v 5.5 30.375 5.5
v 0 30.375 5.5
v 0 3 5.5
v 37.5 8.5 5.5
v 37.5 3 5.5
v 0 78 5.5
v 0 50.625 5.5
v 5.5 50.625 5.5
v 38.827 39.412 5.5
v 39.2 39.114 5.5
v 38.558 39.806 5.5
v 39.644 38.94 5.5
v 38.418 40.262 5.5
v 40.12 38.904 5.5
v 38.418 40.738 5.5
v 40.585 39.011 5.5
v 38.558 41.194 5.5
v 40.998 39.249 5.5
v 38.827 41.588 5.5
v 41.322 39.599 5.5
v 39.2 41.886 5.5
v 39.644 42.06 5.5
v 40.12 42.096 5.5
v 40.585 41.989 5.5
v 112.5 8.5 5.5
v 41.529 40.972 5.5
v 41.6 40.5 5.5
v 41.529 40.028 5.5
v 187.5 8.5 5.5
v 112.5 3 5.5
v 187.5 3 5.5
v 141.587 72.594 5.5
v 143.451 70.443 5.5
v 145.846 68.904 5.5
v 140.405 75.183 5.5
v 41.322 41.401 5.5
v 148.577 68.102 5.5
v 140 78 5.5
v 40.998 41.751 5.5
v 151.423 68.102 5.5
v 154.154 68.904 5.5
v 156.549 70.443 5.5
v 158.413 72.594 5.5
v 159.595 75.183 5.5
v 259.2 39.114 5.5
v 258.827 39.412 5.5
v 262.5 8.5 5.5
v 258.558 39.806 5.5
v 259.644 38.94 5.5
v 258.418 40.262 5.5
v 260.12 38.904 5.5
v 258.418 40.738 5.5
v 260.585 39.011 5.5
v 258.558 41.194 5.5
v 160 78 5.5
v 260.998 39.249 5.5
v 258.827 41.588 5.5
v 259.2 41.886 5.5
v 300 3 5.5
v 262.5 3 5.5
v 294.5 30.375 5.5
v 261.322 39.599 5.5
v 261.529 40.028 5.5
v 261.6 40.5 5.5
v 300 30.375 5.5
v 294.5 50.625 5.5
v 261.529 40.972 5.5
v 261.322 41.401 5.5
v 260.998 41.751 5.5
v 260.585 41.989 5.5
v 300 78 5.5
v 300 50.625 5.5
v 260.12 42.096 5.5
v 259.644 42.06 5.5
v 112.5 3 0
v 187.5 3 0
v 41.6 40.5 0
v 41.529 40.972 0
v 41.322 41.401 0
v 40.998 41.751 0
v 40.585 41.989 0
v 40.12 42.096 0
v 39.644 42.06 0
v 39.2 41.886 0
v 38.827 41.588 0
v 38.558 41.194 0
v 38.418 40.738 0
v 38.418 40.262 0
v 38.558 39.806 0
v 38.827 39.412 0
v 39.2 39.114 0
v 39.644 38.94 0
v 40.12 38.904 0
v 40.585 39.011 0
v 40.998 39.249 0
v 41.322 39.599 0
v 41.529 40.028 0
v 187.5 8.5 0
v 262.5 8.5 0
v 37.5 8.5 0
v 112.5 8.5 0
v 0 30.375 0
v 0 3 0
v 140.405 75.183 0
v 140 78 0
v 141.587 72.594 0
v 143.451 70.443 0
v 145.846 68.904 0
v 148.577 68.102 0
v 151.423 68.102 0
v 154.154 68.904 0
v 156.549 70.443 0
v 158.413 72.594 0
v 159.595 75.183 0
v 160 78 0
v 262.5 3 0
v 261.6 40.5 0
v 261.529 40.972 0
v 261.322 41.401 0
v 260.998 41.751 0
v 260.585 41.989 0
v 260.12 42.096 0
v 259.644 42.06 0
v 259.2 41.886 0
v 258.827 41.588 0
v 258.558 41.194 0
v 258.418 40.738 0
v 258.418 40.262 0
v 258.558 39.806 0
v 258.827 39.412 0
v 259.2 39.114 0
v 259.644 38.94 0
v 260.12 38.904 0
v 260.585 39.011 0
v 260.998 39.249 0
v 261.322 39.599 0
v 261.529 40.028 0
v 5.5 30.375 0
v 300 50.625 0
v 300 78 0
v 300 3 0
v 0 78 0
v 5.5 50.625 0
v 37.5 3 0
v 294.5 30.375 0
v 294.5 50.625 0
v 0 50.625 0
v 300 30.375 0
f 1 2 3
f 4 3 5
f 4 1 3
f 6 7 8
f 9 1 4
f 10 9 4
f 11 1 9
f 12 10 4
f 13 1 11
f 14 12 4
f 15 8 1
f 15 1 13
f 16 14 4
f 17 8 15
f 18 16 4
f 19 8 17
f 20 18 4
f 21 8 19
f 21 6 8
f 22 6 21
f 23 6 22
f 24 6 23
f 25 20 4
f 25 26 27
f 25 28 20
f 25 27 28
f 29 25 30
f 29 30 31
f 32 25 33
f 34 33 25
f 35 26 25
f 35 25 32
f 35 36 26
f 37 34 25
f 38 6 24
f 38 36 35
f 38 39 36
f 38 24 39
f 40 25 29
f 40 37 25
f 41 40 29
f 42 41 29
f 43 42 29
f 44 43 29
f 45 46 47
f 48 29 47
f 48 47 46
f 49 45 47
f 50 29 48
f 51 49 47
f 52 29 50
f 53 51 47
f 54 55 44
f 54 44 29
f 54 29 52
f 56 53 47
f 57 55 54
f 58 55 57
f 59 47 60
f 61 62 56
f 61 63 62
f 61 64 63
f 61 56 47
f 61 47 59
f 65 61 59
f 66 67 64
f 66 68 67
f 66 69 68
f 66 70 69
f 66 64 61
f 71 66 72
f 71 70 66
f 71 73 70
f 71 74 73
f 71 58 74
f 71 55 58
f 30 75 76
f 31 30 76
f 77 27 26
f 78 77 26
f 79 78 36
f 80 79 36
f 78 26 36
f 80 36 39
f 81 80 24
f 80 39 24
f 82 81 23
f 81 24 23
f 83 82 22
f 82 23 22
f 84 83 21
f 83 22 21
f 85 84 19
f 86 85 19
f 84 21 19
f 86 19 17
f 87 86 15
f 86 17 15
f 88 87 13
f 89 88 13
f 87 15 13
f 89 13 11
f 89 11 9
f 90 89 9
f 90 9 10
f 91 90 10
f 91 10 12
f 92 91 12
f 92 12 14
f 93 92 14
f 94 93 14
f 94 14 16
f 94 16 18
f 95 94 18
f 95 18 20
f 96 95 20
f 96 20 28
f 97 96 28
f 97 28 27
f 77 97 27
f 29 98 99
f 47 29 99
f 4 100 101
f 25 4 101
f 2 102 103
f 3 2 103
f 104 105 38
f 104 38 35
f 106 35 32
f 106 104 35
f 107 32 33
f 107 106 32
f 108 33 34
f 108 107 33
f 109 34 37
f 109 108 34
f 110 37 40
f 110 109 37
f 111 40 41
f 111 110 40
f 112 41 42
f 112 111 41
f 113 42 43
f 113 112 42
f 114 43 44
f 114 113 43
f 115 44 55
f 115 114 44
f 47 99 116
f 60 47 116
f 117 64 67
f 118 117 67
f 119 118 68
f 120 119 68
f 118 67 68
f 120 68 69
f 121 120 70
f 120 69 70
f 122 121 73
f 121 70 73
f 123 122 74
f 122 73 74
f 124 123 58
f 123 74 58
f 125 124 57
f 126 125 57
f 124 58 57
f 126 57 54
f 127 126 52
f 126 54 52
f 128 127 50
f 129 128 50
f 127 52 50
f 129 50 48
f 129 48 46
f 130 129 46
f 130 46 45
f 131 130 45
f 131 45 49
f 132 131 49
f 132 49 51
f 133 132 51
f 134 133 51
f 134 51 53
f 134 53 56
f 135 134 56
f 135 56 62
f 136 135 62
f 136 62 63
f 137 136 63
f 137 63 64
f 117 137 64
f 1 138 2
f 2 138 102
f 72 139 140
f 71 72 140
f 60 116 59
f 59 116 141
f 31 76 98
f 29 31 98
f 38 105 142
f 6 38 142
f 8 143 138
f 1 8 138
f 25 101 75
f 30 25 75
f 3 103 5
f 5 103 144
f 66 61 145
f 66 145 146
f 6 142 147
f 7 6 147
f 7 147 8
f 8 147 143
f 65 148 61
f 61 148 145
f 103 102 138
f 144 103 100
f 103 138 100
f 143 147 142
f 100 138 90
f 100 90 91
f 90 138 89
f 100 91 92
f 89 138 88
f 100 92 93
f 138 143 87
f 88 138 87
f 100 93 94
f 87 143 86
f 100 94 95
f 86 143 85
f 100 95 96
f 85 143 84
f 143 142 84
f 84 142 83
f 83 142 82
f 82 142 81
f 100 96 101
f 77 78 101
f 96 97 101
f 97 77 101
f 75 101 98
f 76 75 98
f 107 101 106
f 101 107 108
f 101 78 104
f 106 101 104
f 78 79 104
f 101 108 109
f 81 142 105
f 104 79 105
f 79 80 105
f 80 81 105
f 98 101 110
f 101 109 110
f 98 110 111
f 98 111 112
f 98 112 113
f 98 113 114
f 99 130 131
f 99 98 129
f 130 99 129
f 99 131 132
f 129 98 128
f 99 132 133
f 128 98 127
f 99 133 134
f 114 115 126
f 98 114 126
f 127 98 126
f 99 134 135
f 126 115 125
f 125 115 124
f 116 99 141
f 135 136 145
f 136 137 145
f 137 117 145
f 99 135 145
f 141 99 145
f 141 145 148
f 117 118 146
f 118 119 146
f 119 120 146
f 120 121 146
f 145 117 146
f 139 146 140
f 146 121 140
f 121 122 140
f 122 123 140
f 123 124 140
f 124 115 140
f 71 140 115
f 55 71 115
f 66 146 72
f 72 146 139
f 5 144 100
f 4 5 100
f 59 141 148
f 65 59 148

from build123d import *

# Parameters (mm, degrees)
BOSS_EXTRUDE1_DEPTH = 5.5
SKETCH2_R           = 10
CUT_EXTRUDE2_DEPTH  = 311.022983019
SKETCH3_R           = 1.6
CUT_EXTRUDE3_DEPTH  = 311.022983019
SKETCH4_W           = 9.45
SKETCH4_H           = 3.25
SKETCH4_W_2         = 2.65
SKETCH4_H_2         = 1.25
SKETCH4_W_3         = 3.25
SKETCH4_H_3         = 9.45
SKETCH4_H_4         = 2.65
SKETCH4_W_4         = 1.25
BOSS_EXTRUDE2_DEPTH = 5.5


with BuildPart() as part:
    # Sketch1 → Boss-Extrude1 (new body)
    with BuildSketch(Plane.XY):
        Polygon((0, 78), (0, 50.625), (5.5, 50.625), (5.5, 42.125), (14.95, 42.125), (14.95, 43.375), (17.6, 43.375), (17.6, 42.125), (20.25, 42.125), (20.25, 38.875), (17.6, 38.875), (17.6, 37.625), (14.95, 37.625), (14.95, 38.875), (5.5, 38.875), (5.5, 30.375), (0, 30.375), (0, 3), (37.5, 3), (37.5, 8.5), (73.375, 8.5), (73.375, 17.95), (72.125, 17.95), (72.125, 20.6), (73.375, 20.6), (73.375, 23.25), (76.625, 23.25), (76.625, 20.6), (77.875, 20.6), (77.875, 17.95), (76.625, 17.95), (76.625, 8.5), (112.5, 8.5), (112.5, 3), (187.5, 3), (187.5, 8.5), (223.375, 8.5), (223.375, 17.95), (222.125, 17.95), (222.125, 20.6), (223.375, 20.6), (223.375, 23.25), (226.625, 23.25), (226.625, 20.6), (227.875, 20.6), (227.875, 17.95), (226.625, 17.95), (226.625, 8.5), (262.5, 8.5), (262.5, 3), (300, 3), (300, 30.375), (294.5, 30.375), (294.5, 38.875), (285.05, 38.875), (285.05, 37.625), (282.4, 37.625), (282.4, 38.875), (279.75, 38.875), (279.75, 42.125), (282.4, 42.125), (282.4, 43.375), (285.05, 43.375), (285.05, 42.125), (294.5, 42.125), (294.5, 50.625), (300, 50.625), (300, 78), align=None)
    extrude(amount=BOSS_EXTRUDE1_DEPTH)

    # Sketch2 → Cut-Extrude2 (cut, through all)
    with BuildSketch(Plane.XY):
        with Locations((150, 78)):
            Circle(SKETCH2_R)
    extrude(amount=CUT_EXTRUDE2_DEPTH, mode=Mode.SUBTRACT)

    # Sketch3 → Cut-Extrude3 (cut, through all)
    with BuildSketch(Plane.XY.offset(5.5)):
        with Locations((40, 40.5)):
            Circle(SKETCH3_R)
        with Locations((260, 40.5)):
            Circle(SKETCH3_R)
    extrude(amount=-CUT_EXTRUDE3_DEPTH, mode=Mode.SUBTRACT)

    # Sketch4 → Boss-Extrude2 (add)
    with BuildSketch(Plane.XY.offset(5.5)):
        with Locations((289.775, 40.5)):
            Rectangle(SKETCH4_W, SKETCH4_H)
        with Locations((283.725, 40.5)):
            Rectangle(SKETCH4_W_2, SKETCH4_H)
        with Locations((281.075, 40.5)):
            Rectangle(SKETCH4_W_2, SKETCH4_H)
        with Locations((283.725, 38.25)):
            Rectangle(SKETCH4_W_2, SKETCH4_H_2)
        with Locations((283.725, 42.75)):
            Rectangle(SKETCH4_W_2, SKETCH4_H_2)
        with Locations((225, 13.225)):
            Rectangle(SKETCH4_W_3, SKETCH4_H_3)
        with Locations((225, 19.275)):
            Rectangle(SKETCH4_W_3, SKETCH4_H_4)
        with Locations((225, 21.925)):
            Rectangle(SKETCH4_W_3, SKETCH4_H_4)
        with Locations((227.25, 19.275)):
            Rectangle(SKETCH4_W_4, SKETCH4_H_4)
        with Locations((222.75, 19.275)):
            Rectangle(SKETCH4_W_4, SKETCH4_H_4)
        with Locations((75, 13.225)):
            Rectangle(SKETCH4_W_3, SKETCH4_H_3)
        with Locations((75, 19.275)):
            Rectangle(SKETCH4_W_3, SKETCH4_H_4)
        with Locations((75, 21.925)):
            Rectangle(SKETCH4_W_3, SKETCH4_H_4)
        with Locations((77.25, 19.275)):
            Rectangle(SKETCH4_W_4, SKETCH4_H_4)
        with Locations((72.75, 19.275)):
            Rectangle(SKETCH4_W_4, SKETCH4_H_4)
        with Locations((10.225, 40.5)):
            Rectangle(SKETCH4_W, SKETCH4_H)
        with Locations((16.275, 40.5)):
            Rectangle(SKETCH4_W_2, SKETCH4_H)
        with Locations((16.275, 38.25)):
            Rectangle(SKETCH4_W_2, SKETCH4_H_2)
        with Locations((18.925, 40.5)):
            Rectangle(SKETCH4_W_2, SKETCH4_H)
        with Locations((16.275, 42.75)):
            Rectangle(SKETCH4_W_2, SKETCH4_H_2)
    extrude(amount=-BOSS_EXTRUDE2_DEPTH)


solid = part.part
